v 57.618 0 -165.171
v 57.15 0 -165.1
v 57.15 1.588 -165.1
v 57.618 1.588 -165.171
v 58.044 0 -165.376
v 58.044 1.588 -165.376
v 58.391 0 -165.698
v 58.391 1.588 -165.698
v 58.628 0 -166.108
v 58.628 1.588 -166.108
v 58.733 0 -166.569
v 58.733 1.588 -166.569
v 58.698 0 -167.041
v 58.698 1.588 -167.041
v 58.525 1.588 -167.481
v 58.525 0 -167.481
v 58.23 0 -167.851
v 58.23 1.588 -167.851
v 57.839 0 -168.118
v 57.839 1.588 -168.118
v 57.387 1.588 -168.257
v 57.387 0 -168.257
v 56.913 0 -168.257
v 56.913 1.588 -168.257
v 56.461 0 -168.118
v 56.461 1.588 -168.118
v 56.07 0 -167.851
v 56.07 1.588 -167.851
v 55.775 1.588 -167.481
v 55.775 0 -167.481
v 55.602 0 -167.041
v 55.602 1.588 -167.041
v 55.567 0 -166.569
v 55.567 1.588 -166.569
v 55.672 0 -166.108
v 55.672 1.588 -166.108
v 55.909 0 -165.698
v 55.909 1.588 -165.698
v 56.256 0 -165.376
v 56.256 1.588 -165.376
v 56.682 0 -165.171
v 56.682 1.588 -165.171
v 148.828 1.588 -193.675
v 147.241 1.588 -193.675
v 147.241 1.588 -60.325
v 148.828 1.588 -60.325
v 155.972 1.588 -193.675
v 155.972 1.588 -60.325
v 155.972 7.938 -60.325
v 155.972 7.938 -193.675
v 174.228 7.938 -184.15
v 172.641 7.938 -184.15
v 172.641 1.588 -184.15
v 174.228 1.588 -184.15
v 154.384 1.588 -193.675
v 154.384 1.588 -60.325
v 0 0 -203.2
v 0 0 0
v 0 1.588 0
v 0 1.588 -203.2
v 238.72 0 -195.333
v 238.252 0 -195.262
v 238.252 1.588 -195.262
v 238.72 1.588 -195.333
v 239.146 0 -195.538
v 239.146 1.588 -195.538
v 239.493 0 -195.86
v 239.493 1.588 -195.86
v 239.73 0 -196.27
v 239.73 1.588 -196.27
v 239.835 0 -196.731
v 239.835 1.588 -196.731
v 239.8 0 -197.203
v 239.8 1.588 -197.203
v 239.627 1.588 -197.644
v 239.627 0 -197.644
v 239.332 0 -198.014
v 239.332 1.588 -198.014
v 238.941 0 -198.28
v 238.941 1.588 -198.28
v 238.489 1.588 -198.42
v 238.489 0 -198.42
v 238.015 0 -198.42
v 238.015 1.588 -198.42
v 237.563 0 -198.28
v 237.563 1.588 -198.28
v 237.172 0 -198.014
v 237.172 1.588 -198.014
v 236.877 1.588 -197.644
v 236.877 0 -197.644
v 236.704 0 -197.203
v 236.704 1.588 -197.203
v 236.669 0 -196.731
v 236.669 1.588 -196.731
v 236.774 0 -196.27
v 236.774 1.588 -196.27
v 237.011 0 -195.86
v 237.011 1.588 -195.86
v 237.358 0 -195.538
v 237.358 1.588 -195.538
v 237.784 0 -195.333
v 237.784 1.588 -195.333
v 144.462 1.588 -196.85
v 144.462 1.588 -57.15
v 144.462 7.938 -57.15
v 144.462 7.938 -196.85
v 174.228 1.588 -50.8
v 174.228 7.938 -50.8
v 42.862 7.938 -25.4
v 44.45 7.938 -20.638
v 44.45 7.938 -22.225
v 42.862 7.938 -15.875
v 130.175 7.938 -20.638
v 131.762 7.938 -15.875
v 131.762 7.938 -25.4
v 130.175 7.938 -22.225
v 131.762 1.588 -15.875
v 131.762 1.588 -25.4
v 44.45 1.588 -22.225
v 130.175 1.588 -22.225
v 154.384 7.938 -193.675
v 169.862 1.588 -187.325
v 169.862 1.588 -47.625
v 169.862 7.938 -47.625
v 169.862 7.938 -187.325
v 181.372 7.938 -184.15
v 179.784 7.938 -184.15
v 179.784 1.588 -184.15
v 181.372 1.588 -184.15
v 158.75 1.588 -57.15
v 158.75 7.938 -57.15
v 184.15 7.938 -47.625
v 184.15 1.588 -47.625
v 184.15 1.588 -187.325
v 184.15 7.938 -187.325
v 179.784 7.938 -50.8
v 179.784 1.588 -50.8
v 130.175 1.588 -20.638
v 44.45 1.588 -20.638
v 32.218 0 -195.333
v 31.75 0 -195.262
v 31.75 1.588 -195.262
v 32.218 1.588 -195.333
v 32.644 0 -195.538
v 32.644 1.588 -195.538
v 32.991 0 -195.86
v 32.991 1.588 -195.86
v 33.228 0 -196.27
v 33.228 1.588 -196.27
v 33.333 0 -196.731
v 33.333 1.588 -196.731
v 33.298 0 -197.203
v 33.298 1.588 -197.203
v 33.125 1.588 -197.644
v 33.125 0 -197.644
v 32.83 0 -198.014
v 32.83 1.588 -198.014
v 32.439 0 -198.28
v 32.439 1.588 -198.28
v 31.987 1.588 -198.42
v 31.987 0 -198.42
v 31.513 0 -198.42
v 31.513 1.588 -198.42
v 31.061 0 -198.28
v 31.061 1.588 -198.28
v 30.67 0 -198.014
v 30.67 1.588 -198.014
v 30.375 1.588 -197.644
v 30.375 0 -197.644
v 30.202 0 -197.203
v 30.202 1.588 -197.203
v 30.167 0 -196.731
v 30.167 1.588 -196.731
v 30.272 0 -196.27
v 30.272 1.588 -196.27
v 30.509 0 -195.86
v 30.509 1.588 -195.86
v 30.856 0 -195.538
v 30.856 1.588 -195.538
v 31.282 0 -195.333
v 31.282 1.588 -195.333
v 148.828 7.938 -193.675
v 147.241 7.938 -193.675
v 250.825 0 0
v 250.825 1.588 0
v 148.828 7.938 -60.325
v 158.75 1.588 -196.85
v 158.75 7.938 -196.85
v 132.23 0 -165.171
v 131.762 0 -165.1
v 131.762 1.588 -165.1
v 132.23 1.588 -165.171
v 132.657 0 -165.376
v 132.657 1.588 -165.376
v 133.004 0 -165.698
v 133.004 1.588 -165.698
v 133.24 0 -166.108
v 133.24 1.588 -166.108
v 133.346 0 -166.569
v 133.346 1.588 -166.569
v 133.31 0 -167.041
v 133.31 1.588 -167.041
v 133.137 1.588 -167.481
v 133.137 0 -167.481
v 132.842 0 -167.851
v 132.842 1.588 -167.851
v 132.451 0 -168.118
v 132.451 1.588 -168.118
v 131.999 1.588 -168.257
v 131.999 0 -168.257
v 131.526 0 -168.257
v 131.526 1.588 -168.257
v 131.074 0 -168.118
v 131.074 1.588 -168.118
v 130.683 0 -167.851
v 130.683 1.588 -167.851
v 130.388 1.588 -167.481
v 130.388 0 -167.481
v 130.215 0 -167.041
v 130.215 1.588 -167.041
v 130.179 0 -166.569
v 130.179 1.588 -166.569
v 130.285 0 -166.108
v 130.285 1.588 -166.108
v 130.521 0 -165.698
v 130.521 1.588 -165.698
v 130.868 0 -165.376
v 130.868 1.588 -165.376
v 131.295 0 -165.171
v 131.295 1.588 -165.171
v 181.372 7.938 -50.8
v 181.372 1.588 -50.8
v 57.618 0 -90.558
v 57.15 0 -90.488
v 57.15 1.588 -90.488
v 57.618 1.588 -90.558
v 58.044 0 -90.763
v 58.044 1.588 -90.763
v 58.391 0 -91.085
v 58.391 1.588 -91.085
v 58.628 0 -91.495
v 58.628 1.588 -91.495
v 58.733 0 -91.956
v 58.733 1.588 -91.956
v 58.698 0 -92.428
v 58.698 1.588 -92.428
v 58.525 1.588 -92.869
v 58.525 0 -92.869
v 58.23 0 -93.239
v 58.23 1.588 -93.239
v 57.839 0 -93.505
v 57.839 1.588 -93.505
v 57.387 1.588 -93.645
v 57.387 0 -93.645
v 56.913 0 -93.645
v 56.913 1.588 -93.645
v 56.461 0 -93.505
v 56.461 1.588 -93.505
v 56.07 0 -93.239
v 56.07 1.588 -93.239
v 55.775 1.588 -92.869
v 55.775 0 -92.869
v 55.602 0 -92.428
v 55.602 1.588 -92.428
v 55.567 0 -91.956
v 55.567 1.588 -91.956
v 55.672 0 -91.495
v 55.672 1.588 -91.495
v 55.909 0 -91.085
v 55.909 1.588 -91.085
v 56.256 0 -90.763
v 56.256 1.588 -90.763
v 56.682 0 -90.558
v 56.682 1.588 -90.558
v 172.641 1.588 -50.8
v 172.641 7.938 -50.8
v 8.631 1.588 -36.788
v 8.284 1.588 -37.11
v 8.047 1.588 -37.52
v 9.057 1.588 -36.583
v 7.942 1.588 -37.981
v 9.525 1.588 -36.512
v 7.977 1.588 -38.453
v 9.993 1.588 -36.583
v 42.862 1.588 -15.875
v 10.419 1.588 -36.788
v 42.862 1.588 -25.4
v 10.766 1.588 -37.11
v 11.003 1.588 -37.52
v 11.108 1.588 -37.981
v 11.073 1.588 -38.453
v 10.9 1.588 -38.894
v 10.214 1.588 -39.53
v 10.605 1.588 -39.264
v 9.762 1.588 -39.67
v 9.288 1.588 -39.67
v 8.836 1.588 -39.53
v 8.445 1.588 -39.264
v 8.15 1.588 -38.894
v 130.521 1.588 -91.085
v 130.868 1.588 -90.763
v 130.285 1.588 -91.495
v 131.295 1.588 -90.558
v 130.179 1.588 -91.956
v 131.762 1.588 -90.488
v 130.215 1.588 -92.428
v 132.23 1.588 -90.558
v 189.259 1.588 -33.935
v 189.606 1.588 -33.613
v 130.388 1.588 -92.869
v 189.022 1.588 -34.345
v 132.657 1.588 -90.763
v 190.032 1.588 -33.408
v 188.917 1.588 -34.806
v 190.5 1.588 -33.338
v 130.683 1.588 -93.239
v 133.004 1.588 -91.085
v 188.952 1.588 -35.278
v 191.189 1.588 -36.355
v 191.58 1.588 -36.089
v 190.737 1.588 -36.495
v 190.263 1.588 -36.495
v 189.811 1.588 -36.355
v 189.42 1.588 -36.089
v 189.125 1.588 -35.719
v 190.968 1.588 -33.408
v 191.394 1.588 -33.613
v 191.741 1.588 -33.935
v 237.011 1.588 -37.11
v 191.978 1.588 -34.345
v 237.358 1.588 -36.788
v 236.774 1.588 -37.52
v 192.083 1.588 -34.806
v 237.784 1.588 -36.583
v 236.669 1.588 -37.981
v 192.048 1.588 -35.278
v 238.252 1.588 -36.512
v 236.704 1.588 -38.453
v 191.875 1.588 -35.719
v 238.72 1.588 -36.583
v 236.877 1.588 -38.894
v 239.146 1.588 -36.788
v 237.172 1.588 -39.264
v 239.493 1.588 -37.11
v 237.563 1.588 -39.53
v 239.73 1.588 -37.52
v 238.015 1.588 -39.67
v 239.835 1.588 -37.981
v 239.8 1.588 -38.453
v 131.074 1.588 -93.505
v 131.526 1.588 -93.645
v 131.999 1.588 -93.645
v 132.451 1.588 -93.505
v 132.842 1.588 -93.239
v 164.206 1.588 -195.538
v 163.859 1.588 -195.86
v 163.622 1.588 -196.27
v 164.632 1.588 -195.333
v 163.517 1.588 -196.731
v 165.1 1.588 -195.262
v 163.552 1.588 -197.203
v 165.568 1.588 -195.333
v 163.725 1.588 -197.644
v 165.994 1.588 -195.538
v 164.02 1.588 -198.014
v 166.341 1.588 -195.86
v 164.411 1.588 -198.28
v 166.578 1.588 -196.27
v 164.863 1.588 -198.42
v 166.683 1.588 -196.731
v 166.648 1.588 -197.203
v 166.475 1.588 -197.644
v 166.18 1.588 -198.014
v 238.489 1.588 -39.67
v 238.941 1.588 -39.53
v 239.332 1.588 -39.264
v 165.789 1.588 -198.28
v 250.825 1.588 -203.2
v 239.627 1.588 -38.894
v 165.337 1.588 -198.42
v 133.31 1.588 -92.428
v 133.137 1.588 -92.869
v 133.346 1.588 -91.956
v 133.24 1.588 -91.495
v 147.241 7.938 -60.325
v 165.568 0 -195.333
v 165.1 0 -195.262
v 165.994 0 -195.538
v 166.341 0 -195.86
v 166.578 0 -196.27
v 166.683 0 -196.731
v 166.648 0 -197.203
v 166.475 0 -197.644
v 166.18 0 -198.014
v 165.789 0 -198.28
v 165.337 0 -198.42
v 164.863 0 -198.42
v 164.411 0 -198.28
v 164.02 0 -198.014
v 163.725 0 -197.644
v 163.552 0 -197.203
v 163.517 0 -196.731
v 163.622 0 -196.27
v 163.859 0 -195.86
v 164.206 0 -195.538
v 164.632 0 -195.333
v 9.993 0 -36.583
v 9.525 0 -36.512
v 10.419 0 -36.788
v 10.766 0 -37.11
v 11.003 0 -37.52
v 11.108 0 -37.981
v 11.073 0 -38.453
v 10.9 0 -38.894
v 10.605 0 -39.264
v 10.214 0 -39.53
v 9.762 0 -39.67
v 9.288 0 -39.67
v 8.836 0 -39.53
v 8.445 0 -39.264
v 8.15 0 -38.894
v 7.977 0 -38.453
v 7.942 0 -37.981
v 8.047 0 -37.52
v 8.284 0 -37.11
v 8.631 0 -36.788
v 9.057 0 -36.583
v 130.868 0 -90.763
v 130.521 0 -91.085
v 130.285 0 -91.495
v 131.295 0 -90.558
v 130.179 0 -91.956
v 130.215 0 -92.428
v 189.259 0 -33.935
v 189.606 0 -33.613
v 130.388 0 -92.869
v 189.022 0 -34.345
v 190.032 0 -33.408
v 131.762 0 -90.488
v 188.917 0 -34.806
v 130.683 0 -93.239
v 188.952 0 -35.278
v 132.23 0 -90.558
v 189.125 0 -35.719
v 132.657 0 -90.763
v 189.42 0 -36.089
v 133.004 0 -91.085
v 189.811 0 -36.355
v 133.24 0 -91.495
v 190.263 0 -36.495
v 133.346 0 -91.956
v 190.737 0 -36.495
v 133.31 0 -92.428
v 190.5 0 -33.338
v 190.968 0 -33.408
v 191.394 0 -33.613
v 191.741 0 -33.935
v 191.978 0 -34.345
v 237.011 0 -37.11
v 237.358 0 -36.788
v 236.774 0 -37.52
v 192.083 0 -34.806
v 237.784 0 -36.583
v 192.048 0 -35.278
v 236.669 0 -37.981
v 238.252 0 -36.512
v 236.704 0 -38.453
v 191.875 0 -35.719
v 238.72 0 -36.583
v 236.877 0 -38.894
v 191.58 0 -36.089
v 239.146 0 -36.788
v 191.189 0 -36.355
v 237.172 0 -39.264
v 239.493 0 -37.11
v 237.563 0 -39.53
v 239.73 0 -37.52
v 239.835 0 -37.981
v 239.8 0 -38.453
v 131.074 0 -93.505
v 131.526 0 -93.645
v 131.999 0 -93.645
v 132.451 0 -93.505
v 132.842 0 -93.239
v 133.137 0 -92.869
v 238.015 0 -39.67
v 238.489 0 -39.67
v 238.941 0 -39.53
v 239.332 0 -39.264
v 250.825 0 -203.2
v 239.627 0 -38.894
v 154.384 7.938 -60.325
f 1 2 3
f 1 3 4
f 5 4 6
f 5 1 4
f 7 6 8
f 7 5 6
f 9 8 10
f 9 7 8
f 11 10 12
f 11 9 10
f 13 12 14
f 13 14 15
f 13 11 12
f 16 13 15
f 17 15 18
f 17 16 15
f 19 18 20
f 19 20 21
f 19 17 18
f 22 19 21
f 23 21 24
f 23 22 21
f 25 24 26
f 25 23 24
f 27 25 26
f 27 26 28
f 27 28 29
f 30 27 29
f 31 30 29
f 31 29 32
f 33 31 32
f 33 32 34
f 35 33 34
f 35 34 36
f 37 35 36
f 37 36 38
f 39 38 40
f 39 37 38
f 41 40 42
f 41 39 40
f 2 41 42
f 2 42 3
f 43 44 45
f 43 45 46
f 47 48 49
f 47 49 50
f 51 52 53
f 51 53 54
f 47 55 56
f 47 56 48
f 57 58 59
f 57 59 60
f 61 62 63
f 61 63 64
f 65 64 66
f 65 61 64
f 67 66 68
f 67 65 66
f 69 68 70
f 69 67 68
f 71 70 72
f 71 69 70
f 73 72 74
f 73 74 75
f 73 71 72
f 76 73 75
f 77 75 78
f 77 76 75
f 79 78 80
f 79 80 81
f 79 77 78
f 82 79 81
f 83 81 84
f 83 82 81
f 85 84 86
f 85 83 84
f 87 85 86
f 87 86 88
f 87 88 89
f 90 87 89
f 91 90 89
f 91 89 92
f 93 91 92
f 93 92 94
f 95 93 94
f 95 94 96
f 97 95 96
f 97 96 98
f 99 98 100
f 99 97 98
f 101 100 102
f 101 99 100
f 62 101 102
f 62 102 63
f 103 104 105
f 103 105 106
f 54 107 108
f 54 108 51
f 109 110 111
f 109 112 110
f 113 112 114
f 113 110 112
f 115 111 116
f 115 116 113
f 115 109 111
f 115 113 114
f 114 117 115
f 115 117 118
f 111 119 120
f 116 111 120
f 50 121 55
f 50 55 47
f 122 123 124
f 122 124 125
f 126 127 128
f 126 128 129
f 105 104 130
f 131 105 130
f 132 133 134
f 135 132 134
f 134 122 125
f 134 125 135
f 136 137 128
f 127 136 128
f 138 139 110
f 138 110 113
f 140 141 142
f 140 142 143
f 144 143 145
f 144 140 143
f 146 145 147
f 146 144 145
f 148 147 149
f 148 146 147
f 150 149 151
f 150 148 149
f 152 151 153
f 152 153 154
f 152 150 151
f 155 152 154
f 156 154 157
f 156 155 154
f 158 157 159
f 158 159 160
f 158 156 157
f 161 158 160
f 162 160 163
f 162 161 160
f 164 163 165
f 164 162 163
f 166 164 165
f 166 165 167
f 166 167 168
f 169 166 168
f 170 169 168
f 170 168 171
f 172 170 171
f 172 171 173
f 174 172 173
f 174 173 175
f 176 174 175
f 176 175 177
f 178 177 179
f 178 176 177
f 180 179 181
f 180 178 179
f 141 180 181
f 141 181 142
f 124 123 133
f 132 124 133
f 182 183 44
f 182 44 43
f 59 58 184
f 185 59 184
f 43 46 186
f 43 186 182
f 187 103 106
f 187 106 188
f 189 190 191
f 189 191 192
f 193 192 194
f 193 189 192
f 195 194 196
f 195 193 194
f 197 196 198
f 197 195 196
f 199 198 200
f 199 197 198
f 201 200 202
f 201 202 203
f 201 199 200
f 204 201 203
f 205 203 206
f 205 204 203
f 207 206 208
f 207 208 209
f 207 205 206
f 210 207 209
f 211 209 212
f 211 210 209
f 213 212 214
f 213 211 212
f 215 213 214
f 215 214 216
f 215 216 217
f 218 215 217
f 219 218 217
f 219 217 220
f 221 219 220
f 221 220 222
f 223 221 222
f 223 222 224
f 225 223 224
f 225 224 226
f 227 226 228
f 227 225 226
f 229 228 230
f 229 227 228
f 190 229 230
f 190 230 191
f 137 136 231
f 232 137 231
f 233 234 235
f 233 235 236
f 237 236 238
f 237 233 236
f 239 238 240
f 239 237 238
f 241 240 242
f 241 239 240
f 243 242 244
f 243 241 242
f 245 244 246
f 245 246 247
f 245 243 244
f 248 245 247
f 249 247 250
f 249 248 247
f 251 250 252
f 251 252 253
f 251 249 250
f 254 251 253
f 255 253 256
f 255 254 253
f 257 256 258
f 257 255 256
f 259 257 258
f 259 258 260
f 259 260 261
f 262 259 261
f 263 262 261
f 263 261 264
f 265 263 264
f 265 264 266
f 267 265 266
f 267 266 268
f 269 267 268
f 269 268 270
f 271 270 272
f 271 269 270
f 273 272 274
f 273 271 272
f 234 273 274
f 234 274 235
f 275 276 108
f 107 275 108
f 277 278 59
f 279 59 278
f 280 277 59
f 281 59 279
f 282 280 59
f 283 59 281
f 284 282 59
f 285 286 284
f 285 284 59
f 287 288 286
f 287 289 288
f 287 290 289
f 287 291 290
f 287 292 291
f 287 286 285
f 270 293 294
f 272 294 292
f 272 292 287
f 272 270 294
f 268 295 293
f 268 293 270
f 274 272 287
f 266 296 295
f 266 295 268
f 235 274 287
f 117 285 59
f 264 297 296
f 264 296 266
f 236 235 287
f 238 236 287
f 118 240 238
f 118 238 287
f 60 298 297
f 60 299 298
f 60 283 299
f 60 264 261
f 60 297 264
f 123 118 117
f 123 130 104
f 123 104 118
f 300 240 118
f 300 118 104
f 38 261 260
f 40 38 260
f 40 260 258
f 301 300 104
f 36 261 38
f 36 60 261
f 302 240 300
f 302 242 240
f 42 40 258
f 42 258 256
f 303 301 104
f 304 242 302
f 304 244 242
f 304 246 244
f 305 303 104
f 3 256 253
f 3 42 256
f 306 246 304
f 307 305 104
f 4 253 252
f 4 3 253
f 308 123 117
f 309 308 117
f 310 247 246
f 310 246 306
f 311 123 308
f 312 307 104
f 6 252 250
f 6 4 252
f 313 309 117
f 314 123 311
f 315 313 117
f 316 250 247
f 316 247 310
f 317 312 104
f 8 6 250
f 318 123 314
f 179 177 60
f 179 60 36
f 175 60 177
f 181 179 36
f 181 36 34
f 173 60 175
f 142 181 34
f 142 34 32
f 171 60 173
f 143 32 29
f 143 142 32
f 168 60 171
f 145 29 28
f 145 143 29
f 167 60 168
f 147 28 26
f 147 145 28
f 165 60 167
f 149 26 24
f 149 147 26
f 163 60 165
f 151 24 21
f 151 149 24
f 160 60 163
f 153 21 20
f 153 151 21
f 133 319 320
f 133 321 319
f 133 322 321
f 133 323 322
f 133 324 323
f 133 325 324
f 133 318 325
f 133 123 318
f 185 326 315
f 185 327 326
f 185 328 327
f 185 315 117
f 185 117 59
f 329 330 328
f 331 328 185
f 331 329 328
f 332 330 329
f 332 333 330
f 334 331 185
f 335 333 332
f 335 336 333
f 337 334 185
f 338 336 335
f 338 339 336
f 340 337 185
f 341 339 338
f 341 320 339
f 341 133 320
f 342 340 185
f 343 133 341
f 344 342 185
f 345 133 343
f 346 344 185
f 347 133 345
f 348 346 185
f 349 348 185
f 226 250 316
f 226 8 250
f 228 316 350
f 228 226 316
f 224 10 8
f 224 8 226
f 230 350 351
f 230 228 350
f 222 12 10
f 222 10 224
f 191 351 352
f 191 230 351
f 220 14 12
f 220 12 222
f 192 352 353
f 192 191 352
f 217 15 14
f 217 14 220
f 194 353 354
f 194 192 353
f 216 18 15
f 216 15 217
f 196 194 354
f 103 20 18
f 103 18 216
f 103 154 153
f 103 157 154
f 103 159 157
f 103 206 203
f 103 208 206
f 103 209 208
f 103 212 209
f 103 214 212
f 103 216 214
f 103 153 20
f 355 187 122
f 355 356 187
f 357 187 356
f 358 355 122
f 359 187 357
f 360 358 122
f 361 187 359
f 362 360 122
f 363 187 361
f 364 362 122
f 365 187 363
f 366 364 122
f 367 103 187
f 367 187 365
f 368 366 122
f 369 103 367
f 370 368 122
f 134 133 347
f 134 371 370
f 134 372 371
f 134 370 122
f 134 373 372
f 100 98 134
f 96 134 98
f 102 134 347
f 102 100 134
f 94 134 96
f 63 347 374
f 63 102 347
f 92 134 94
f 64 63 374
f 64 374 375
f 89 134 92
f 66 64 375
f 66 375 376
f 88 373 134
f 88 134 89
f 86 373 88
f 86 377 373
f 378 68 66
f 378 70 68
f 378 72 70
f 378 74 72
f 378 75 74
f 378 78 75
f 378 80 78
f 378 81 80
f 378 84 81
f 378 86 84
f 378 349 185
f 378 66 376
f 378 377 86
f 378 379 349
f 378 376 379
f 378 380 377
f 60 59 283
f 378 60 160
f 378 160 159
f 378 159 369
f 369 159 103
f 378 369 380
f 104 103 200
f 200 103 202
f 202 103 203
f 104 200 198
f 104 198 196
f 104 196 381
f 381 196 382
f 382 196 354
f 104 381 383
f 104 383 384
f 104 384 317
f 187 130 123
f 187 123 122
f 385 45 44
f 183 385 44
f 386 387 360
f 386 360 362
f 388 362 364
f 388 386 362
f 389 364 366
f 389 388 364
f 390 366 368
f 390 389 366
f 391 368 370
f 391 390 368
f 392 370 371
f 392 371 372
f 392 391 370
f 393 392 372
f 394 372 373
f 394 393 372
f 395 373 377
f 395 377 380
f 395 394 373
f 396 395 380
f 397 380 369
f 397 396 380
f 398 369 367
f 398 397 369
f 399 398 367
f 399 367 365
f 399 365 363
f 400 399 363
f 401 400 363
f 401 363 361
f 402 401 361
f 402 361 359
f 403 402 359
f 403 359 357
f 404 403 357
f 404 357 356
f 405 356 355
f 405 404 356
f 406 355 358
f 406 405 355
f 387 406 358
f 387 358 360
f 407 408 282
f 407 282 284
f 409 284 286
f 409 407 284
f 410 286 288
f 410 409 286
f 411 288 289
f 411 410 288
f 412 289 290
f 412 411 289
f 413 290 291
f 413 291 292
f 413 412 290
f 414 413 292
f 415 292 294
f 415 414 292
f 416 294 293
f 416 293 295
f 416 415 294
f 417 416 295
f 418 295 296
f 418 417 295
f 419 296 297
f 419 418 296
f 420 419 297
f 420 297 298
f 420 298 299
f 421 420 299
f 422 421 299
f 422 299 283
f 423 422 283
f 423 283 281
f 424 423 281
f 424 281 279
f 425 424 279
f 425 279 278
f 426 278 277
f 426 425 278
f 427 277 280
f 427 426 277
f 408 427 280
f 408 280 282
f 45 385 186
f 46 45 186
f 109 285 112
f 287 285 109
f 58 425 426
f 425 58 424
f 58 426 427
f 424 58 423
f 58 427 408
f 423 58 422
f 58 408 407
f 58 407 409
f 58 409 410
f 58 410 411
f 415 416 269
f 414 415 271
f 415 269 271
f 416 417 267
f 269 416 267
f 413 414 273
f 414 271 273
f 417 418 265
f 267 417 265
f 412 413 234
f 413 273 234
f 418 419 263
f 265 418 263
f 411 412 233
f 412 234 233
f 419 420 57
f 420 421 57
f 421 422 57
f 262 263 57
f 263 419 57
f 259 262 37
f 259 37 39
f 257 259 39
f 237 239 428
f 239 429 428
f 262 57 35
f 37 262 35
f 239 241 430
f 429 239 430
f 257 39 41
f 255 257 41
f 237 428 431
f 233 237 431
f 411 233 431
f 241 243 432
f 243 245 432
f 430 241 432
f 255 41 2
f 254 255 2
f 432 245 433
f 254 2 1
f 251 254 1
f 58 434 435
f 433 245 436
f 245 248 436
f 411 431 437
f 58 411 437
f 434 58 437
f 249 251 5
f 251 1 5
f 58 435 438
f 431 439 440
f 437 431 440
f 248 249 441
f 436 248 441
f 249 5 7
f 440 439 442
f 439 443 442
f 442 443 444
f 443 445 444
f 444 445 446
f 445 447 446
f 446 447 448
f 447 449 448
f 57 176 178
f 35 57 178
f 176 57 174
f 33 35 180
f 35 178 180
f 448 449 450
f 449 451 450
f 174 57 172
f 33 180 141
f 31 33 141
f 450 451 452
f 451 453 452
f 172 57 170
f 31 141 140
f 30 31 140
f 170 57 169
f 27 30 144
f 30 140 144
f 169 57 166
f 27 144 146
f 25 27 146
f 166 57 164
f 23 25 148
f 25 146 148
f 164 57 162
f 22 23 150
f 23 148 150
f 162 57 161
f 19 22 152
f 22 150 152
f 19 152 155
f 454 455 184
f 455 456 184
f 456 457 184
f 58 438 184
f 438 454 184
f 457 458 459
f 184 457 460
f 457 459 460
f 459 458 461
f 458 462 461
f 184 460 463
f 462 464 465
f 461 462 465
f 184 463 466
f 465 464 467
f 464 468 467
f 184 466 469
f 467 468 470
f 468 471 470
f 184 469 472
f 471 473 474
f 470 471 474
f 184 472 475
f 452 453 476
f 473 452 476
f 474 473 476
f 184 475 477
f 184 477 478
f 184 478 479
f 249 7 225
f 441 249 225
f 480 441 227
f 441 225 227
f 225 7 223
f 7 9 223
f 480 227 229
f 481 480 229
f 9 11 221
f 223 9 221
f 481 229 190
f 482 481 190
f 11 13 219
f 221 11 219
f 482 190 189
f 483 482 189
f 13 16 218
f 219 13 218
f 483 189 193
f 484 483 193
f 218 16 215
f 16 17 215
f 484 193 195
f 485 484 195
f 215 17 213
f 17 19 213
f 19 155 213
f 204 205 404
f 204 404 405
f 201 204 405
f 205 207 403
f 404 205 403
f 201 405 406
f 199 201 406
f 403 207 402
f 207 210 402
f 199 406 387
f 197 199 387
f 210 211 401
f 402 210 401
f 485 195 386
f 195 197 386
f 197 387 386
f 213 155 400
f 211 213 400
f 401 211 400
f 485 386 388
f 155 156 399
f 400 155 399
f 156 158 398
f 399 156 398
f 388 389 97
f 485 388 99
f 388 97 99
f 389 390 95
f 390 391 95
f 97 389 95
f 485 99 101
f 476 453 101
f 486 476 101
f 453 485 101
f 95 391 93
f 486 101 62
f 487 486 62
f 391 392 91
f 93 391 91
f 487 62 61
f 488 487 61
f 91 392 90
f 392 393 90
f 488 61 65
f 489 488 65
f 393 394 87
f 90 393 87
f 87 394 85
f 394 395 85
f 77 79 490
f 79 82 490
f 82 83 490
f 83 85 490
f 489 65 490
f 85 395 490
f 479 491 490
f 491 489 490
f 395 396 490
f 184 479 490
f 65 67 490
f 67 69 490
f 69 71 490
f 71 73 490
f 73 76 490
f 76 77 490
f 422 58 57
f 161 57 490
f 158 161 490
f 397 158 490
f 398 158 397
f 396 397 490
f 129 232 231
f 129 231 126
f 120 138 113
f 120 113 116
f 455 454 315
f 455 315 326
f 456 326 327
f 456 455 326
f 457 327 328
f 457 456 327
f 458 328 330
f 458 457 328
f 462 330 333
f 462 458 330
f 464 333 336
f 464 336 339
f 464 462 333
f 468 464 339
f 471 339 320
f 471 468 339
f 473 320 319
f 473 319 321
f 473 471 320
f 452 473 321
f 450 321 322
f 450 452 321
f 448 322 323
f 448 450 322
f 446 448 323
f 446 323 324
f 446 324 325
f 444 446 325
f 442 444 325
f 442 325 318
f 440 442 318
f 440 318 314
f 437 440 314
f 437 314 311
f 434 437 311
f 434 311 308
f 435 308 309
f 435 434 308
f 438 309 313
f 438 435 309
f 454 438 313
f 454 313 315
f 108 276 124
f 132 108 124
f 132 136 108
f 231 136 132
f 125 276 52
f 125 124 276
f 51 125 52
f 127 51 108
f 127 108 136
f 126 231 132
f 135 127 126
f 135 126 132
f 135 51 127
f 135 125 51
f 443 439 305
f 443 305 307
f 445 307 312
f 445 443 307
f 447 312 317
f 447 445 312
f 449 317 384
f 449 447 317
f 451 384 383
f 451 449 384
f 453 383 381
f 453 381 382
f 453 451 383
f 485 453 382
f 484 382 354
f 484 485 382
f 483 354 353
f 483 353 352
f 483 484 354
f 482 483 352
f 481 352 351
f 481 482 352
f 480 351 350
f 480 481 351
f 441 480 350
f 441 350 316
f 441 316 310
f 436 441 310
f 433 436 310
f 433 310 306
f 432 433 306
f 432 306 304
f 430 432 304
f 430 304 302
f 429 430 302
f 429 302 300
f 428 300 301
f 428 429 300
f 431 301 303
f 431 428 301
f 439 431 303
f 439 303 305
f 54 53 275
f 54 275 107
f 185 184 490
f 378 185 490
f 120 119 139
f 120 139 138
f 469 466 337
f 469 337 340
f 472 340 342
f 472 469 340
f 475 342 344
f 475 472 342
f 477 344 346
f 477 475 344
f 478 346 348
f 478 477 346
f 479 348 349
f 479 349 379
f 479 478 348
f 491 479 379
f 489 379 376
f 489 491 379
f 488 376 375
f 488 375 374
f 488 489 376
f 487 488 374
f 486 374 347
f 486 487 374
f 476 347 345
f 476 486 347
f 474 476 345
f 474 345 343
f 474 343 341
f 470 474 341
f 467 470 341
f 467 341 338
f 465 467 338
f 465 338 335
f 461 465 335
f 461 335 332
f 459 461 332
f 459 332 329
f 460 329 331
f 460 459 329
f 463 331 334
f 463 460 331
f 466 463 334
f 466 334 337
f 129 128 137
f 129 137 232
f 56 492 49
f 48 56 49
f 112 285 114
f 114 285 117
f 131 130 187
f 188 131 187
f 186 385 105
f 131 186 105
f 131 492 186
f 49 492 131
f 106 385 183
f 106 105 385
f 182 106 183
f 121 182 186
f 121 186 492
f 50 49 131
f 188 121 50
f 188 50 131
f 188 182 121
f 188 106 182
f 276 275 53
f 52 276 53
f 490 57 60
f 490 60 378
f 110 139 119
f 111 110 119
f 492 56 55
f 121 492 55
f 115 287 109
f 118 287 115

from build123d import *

# Parameters (mm, degrees)
SKETCH1_W           = 250.825
SKETCH1_H           = 203.2
SKETCH1_R           = 1.5875
BOSS_EXTRUDE1_DEPTH = 1.5875
SKETCH2_W           = 14.2875
SKETCH2_H           = 139.7
SKETCH2_W_2         = 1.5875
SKETCH2_H_2         = 133.35
SKETCH2_W_3         = 88.9
SKETCH2_H_3         = 9.525
SKETCH2_W_4         = 85.725
SKETCH2_H_4         = 1.5875
BOSS_EXTRUDE2_DEPTH = 6.35


with BuildPart() as part:
    # Sketch1 → Boss-Extrude1 (new body)
    with BuildSketch(Plane(origin=(0, 0, 0), x_dir=(1, 0, 0), z_dir=(0, 1, 0))):
        with Locations((125.4125, 101.6)):
            Rectangle(SKETCH1_W, SKETCH1_H)
        with Locations(Location((31.75, 196.85, 0), (0, 0, 270))):
            Circle(SKETCH1_R, mode=Mode.SUBTRACT)
        with Locations(Location((165.1, 196.85, 0), (0, 0, 270))):
            Circle(SKETCH1_R, mode=Mode.SUBTRACT)
        with Locations(Location((238.252, 196.85, 0), (0, 0, 270))):
            Circle(SKETCH1_R, mode=Mode.SUBTRACT)
        with Locations(Location((238.252, 38.1, 0), (0, 0, 270))):
            Circle(SKETCH1_R, mode=Mode.SUBTRACT)
        with Locations(Location((190.5, 34.925, 0), (0, 0, 270))):
            Circle(SKETCH1_R, mode=Mode.SUBTRACT)
        with Locations(Location((9.525, 38.1, 0), (0, 0, 270))):
            Circle(SKETCH1_R, mode=Mode.SUBTRACT)
        with Locations(Location((57.15, 166.6875, 0), (0, 0, 270))):
            Circle(SKETCH1_R, mode=Mode.SUBTRACT)
        with Locations(Location((131.7625, 166.6875, 0), (0, 0, 270))):
            Circle(SKETCH1_R, mode=Mode.SUBTRACT)
        with Locations(Location((131.7625, 92.075, 0), (0, 0, 270))):
            Circle(SKETCH1_R, mode=Mode.SUBTRACT)
        with Locations(Location((57.15, 92.075, 0), (0, 0, 270))):
            Circle(SKETCH1_R, mode=Mode.SUBTRACT)
    extrude(amount=BOSS_EXTRUDE1_DEPTH)

    # Sketch2 → Boss-Extrude2 (add)
    # profile 1 of 3: a face of its own
    with BuildSketch(Plane(origin=(0, 1.5875, 0), x_dir=(1, 0, 0), z_dir=(0, 1, 0))):
        with Locations((151.60625, 127)):
            Rectangle(SKETCH2_W, SKETCH2_H)
        with Locations((148.034375, 127)):
            Rectangle(SKETCH2_W_2, SKETCH2_H_2, mode=Mode.SUBTRACT)
        with Locations((155.178125, 127)):
            Rectangle(SKETCH2_W_2, SKETCH2_H_2, mode=Mode.SUBTRACT)
    # profile 2 of 3: a face of its own
    with BuildSketch(Plane(origin=(0, 1.5875, 0), x_dir=(1, 0, 0), z_dir=(0, 1, 0))):
        with Locations((177.00625, 117.475)):
            Rectangle(SKETCH2_W, SKETCH2_H)
        with Locations((173.434375, 117.475)):
            Rectangle(SKETCH2_W_2, SKETCH2_H_2, mode=Mode.SUBTRACT)
        with Locations((180.578125, 117.475)):
            Rectangle(SKETCH2_W_2, SKETCH2_H_2, mode=Mode.SUBTRACT)
    # profile 3 of 3: a face of its own
    with BuildSketch(Plane(origin=(0, 1.5875, 0), x_dir=(1, 0, 0), z_dir=(0, 1, 0))):
        with Locations((87.3125, 20.6375)):
            Rectangle(SKETCH2_W_3, SKETCH2_H_3)
        with Locations((87.3125, 21.43125)):
            Rectangle(SKETCH2_W_4, SKETCH2_H_4, mode=Mode.SUBTRACT)
    extrude(amount=BOSS_EXTRUDE2_DEPTH)


solid = part.part
